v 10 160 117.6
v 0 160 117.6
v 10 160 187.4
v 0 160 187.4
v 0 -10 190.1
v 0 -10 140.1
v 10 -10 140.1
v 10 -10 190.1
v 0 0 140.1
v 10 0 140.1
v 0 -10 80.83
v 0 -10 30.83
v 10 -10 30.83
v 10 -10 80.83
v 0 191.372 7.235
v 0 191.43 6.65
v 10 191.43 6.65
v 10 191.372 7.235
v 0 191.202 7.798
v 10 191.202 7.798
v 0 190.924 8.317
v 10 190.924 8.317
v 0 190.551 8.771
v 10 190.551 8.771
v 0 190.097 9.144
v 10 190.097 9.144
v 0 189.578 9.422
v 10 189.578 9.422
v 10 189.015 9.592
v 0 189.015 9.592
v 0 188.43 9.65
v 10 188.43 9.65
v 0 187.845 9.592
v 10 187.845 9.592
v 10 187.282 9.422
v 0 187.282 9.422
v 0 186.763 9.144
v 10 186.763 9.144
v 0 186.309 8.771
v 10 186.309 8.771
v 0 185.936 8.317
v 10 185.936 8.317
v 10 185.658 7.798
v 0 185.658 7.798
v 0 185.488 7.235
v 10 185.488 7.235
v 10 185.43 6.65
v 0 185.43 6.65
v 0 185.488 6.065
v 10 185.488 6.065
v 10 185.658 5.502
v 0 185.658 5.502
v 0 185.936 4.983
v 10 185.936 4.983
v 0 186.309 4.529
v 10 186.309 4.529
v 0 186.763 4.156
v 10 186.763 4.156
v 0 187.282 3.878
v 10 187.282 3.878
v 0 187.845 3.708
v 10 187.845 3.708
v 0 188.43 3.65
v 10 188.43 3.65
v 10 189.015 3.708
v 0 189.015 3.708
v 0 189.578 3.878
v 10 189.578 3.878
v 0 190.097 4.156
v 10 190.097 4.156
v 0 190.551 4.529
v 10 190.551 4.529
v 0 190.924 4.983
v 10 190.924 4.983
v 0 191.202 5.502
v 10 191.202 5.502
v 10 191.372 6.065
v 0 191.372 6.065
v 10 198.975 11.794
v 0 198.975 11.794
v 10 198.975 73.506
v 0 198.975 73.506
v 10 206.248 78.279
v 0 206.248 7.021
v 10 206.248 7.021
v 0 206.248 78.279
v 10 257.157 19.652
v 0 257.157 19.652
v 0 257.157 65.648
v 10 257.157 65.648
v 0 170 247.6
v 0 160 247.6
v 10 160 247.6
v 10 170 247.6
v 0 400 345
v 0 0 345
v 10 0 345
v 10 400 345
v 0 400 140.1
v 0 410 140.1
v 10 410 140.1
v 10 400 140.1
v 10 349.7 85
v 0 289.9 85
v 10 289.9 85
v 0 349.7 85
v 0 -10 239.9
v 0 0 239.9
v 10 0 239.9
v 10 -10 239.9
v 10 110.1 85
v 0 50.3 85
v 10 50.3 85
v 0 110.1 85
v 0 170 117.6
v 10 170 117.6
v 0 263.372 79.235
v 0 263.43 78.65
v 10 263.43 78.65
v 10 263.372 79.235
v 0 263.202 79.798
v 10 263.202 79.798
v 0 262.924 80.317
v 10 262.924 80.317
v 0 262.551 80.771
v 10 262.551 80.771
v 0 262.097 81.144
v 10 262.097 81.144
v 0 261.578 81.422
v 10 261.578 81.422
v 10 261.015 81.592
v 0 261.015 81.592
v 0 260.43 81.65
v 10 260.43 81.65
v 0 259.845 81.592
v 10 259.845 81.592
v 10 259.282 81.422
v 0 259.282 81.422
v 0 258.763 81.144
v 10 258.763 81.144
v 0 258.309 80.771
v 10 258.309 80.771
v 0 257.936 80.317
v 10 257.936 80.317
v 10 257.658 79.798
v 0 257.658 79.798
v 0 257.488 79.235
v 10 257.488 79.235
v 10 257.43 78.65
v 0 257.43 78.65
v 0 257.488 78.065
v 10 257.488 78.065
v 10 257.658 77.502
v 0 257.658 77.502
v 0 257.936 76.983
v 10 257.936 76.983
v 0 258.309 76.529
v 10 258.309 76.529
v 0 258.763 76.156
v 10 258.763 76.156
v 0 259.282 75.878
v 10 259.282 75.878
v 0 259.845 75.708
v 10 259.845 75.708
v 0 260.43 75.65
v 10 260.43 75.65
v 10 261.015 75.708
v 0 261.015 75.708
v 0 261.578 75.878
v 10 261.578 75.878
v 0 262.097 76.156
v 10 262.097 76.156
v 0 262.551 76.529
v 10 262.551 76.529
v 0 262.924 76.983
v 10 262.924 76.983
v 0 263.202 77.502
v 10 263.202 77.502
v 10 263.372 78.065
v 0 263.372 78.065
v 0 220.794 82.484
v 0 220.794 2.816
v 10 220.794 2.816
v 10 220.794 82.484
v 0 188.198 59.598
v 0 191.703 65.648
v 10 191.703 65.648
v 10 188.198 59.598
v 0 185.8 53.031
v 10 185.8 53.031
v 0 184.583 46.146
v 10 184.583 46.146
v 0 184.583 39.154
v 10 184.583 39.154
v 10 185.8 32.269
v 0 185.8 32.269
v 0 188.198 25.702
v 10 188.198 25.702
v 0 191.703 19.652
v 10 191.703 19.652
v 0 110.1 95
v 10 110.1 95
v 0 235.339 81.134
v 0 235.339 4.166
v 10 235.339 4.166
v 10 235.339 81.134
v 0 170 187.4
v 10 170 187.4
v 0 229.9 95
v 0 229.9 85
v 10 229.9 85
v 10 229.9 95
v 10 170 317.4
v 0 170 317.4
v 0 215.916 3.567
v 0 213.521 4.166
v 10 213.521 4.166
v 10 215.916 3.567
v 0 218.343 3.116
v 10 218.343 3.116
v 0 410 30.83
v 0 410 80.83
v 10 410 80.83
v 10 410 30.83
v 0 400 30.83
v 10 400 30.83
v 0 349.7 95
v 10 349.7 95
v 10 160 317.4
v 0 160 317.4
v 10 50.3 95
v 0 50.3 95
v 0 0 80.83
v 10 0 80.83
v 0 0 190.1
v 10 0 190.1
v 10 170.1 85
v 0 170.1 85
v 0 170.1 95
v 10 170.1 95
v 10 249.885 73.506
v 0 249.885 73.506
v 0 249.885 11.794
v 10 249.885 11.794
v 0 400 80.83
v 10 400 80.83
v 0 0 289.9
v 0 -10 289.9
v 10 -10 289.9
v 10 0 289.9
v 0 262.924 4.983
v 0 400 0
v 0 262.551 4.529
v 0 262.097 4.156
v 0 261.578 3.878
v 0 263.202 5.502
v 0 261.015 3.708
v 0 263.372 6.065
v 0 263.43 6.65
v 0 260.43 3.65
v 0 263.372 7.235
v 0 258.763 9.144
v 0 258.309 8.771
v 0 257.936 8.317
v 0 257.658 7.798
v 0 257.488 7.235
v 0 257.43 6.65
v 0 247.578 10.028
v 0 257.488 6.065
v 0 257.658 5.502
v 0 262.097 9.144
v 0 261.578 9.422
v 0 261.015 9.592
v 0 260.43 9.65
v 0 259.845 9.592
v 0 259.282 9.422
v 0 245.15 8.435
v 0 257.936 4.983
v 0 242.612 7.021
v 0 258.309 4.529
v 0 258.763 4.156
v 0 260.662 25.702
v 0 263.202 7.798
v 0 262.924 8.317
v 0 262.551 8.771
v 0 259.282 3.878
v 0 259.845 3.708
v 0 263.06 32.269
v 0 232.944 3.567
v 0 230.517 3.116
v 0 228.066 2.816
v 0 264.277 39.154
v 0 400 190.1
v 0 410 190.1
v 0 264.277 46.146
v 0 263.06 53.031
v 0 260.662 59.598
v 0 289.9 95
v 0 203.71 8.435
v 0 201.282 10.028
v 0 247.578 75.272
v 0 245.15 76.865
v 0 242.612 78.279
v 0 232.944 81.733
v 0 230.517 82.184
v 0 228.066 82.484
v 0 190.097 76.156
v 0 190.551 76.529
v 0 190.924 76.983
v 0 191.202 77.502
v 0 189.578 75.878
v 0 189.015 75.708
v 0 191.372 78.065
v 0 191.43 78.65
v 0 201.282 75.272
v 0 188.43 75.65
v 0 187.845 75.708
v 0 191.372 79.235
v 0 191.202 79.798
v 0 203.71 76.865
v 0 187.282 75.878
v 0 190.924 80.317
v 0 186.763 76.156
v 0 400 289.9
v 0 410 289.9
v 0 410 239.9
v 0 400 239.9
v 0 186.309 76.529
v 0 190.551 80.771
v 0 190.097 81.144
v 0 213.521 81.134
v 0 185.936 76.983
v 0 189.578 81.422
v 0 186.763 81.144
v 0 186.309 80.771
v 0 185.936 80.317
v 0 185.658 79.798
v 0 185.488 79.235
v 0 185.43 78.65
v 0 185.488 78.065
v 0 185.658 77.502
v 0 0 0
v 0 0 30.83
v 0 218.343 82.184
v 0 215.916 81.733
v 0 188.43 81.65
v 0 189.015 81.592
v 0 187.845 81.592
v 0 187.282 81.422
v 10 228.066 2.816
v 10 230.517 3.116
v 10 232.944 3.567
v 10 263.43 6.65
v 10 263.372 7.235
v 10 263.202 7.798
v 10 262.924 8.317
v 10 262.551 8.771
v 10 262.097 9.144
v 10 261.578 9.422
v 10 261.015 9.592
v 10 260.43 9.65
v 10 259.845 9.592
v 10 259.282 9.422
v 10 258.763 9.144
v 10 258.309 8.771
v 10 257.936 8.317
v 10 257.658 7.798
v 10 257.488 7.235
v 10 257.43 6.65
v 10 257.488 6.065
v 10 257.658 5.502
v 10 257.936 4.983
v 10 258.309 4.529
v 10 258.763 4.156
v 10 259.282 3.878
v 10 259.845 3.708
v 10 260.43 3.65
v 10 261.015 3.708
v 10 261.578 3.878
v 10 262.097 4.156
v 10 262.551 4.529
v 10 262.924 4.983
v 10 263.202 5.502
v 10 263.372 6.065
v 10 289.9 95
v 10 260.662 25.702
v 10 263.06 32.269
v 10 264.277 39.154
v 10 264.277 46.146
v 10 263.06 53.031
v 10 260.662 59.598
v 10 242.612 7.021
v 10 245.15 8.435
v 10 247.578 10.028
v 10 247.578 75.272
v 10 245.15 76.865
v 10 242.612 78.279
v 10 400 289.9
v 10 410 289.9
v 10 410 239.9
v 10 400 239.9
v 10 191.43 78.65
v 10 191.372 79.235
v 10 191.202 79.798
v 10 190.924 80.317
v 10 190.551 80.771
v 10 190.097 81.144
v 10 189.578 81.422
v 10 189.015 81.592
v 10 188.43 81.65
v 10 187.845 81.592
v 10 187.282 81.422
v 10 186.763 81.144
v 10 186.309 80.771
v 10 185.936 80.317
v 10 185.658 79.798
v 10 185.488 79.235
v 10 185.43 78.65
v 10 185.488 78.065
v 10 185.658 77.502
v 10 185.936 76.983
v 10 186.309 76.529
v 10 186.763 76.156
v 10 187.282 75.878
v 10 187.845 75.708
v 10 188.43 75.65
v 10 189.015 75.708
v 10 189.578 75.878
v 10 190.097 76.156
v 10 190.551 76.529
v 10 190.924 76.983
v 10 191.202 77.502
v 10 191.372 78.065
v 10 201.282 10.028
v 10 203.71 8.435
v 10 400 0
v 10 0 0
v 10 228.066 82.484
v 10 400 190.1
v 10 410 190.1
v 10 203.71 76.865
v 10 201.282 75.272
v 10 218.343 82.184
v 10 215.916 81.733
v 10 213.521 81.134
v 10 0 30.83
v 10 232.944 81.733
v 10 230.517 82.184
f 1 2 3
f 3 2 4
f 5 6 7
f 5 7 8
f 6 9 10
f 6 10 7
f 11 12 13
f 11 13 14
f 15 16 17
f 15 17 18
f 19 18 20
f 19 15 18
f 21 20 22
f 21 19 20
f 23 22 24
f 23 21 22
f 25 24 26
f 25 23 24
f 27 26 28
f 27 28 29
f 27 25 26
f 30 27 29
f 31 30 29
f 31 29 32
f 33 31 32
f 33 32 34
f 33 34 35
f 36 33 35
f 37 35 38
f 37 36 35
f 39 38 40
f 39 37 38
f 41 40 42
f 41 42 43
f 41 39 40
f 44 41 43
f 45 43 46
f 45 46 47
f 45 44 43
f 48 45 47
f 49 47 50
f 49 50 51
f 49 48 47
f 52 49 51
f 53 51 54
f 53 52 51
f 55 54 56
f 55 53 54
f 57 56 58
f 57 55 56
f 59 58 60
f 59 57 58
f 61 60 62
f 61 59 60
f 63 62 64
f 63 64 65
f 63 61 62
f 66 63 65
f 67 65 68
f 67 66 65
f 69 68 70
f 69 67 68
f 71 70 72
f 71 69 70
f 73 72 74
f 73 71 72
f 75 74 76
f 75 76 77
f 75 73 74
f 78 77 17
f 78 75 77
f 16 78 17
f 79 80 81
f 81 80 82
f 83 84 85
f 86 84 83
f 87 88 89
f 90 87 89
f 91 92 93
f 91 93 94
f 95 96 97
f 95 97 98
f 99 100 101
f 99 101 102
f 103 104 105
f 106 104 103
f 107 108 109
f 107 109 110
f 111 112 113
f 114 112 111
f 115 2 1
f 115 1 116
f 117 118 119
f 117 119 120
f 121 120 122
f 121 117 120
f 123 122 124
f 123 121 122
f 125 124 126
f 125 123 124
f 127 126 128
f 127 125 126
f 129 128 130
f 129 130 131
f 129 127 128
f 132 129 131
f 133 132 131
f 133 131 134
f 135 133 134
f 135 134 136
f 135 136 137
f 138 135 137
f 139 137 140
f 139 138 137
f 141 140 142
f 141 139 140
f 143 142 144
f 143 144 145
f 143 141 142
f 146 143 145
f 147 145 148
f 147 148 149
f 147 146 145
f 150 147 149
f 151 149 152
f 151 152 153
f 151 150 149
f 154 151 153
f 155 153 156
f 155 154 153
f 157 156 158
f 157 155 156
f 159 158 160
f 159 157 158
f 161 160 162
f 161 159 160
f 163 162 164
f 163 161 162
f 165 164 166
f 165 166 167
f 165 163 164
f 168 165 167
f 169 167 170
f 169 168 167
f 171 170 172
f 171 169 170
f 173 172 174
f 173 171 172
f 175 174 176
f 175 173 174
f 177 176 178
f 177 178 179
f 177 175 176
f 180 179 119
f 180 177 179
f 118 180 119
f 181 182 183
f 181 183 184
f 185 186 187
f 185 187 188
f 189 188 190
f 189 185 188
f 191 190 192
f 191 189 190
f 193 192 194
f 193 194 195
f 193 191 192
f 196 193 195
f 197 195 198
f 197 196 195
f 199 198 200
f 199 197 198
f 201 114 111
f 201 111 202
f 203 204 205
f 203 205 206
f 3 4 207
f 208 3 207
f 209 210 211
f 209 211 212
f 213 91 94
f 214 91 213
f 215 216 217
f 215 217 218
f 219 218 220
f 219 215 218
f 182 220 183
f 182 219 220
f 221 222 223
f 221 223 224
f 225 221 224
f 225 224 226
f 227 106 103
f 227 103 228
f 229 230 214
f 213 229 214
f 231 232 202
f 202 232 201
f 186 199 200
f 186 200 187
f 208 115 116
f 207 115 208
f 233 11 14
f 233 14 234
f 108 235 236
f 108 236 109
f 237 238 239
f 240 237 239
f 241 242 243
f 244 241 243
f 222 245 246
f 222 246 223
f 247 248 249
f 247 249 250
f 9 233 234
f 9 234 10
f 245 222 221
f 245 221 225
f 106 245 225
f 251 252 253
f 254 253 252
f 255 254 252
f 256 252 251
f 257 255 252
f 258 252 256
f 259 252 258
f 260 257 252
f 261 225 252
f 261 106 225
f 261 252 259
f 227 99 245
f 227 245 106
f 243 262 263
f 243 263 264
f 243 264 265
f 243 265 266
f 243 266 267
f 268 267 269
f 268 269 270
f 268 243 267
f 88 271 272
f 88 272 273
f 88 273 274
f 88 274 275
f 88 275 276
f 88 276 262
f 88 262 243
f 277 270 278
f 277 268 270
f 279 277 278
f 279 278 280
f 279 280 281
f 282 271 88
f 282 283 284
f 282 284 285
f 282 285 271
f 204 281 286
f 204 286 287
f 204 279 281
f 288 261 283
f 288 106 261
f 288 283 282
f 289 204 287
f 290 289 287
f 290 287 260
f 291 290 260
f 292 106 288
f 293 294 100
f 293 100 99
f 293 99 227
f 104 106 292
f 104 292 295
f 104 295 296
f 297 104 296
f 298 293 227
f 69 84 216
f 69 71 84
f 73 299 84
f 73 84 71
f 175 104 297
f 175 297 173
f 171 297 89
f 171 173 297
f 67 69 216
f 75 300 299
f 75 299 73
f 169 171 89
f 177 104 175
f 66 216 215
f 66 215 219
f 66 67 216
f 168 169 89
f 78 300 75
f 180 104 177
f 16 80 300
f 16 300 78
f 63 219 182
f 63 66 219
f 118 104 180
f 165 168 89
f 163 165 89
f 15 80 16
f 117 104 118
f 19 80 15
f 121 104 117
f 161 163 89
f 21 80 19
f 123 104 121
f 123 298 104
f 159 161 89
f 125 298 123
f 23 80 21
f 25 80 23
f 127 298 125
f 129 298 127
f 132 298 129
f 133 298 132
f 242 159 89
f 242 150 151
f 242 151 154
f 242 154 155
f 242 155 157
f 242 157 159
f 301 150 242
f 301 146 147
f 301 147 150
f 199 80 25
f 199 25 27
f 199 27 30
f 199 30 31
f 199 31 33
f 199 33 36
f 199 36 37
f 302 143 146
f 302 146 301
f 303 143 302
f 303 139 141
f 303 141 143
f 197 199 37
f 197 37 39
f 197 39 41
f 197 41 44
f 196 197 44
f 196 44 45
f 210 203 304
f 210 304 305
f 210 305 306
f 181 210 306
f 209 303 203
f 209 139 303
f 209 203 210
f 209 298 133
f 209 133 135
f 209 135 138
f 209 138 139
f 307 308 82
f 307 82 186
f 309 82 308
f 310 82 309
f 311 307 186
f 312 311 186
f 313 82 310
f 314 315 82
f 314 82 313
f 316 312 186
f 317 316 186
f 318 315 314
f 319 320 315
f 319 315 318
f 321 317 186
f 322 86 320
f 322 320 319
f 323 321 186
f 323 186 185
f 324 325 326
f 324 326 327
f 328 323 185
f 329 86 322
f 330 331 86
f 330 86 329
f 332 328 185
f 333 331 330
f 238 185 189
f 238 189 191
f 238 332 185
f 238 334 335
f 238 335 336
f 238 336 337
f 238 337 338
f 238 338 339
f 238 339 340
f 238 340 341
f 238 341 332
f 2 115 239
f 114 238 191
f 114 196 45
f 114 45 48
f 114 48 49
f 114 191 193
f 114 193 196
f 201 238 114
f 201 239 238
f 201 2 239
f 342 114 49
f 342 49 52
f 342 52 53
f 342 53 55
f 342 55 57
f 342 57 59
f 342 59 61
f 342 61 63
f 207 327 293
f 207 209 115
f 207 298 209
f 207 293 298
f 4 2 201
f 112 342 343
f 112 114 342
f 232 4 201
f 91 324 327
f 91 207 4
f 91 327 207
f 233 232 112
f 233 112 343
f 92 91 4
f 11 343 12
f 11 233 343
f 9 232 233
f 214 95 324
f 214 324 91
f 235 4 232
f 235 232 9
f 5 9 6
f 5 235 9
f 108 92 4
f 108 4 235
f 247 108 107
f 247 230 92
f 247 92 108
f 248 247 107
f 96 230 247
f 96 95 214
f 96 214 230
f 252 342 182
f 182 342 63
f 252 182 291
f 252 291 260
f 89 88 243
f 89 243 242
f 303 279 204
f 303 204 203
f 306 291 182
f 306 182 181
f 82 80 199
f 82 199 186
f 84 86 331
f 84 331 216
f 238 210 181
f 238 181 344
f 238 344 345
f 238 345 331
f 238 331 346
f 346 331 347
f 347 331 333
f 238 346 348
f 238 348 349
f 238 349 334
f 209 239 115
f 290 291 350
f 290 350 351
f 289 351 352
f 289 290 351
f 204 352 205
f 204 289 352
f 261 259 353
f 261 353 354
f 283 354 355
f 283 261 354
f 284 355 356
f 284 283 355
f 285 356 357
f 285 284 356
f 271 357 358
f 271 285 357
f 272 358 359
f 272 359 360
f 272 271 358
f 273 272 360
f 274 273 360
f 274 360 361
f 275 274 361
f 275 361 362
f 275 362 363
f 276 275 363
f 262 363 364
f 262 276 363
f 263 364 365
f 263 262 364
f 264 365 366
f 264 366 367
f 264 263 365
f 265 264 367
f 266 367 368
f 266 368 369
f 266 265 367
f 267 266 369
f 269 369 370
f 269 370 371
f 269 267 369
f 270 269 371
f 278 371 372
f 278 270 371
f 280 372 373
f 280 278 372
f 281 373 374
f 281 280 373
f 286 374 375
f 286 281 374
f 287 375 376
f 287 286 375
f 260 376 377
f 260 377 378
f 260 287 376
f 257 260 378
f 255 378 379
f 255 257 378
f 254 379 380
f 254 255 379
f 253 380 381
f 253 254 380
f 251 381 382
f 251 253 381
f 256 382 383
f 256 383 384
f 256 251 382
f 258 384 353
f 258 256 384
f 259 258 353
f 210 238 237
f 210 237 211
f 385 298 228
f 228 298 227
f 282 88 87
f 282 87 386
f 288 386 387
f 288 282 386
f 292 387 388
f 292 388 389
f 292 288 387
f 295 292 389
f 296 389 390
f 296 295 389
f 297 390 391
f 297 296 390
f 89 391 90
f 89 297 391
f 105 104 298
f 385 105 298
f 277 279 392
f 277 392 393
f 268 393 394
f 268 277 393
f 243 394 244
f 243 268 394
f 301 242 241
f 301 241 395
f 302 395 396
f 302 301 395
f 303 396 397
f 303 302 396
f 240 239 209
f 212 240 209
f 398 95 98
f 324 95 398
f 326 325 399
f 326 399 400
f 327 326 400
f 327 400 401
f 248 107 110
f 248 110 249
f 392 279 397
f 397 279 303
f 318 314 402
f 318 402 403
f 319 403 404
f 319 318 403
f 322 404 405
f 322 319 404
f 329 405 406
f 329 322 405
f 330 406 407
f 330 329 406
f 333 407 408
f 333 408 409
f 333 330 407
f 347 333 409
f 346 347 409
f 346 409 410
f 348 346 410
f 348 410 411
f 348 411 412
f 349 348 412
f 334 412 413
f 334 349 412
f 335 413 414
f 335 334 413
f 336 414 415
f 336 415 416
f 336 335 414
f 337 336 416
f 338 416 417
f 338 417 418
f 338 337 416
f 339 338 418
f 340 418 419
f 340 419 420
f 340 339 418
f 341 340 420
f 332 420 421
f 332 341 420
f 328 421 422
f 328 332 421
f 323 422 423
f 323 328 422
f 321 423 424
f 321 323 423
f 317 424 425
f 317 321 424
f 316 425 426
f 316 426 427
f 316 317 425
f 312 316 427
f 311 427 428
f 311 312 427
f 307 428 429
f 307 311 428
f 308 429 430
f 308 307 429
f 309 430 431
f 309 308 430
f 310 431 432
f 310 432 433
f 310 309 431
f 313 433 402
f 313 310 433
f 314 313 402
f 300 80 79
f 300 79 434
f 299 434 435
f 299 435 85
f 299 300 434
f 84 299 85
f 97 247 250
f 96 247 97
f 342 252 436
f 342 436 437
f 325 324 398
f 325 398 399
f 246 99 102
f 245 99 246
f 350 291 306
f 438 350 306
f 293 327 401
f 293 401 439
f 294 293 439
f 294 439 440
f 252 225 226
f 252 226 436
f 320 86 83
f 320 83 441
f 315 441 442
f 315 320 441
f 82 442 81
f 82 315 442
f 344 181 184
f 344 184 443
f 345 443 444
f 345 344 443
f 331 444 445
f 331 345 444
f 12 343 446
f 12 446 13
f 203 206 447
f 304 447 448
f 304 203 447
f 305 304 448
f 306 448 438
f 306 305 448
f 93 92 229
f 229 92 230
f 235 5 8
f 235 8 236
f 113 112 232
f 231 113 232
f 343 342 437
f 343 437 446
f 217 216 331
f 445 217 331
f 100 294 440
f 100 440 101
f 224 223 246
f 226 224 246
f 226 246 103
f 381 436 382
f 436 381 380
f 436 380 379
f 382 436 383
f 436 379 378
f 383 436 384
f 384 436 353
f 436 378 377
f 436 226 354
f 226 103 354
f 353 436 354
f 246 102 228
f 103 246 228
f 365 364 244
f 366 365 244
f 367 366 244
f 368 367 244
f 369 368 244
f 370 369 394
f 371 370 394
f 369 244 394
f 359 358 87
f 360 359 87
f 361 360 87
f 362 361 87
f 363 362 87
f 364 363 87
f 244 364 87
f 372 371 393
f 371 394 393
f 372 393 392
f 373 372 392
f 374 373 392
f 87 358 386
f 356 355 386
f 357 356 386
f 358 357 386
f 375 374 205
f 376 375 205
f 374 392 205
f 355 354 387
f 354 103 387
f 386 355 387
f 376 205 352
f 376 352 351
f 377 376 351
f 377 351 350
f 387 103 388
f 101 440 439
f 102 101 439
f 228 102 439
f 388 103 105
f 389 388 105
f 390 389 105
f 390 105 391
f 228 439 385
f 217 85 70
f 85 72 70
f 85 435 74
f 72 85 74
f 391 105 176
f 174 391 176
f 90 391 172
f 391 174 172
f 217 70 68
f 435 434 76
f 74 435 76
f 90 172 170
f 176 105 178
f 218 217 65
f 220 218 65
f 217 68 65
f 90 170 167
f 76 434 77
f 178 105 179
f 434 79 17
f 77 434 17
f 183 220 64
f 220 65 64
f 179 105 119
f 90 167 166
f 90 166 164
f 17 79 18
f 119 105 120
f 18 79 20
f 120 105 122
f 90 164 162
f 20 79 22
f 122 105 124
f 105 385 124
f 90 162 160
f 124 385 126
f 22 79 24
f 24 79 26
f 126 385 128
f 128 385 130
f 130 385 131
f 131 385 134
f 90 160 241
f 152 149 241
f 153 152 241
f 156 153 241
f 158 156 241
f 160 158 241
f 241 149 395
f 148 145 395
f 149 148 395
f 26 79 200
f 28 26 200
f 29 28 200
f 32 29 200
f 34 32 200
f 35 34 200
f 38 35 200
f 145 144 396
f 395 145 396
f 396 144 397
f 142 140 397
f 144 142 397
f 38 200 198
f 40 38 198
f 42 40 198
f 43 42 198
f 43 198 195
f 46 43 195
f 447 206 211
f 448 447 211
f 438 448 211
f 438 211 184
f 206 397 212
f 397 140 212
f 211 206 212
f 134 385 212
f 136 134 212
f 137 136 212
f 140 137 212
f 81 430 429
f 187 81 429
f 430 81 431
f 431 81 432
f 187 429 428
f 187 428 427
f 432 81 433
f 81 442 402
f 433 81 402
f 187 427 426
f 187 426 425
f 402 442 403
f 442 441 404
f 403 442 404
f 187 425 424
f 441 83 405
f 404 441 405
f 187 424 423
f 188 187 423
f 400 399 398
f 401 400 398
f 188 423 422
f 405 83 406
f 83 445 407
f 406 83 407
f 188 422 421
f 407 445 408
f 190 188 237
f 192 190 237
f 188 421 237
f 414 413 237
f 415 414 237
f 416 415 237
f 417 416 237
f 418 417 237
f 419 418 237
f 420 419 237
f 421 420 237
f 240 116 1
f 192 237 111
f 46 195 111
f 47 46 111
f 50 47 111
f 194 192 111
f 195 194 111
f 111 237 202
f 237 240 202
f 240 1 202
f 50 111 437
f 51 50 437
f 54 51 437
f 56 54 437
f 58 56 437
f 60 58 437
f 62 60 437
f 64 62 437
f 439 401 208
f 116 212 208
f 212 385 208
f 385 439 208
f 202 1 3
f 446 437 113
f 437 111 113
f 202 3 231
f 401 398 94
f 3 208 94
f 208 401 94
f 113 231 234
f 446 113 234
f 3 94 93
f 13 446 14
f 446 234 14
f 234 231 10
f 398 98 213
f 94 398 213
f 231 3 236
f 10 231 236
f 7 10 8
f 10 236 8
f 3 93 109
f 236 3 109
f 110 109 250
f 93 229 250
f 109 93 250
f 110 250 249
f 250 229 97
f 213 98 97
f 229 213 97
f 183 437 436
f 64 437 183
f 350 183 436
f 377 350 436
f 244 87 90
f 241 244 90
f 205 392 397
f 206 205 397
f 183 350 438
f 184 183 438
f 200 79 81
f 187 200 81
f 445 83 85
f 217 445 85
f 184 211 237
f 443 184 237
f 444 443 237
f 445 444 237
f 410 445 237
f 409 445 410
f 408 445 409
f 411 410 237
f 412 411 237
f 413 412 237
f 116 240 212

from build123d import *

# Parameters (mm, degrees)
SKETCH_R   = 3
SKETCH_W   = 59.8
SKETCH_H   = 10
SKETCH_W_2 = 10
SKETCH_H_2 = 69.8
PAD_DEPTH  = 10


with BuildPart() as part:
    # Sketch → Pad (new body)
    with BuildSketch(Plane.YZ):
        Polygon((0, 0), (0, 30.83), (-10, 30.83), (-10, 80.83), (0, 80.83), (0, 140.1), (-10, 140.1), (-10, 190.1), (0, 190.1), (0, 239.9), (-10, 239.9), (-10, 289.9), (0, 289.9), (0, 345), (400, 345), (400, 289.9), (410, 289.9), (410, 239.9), (400, 239.9), (400, 190.1), (410, 190.1), (410, 140.1), (400, 140.1), (400, 80.83), (410, 80.83), (410, 30.83), (400, 30.83), (400, 0), align=None)
        with Locations((188.43, 6.65)):
            Circle(SKETCH_R, mode=Mode.SUBTRACT)
        with Locations((260.43, 6.65)):
            Circle(SKETCH_R, mode=Mode.SUBTRACT)
        with Locations((260.43, 78.65)):
            Circle(SKETCH_R, mode=Mode.SUBTRACT)
        with Locations((188.43, 78.65)):
            Circle(SKETCH_R, mode=Mode.SUBTRACT)
        with Locations((80.2, 90)):
            Rectangle(SKETCH_W, SKETCH_H, mode=Mode.SUBTRACT)
        with Locations((200, 90)):
            Rectangle(SKETCH_W, SKETCH_H, mode=Mode.SUBTRACT)
        with Locations((319.8, 90)):
            Rectangle(SKETCH_W, SKETCH_H, mode=Mode.SUBTRACT)
        with Locations((165, 282.5)):
            Rectangle(SKETCH_W_2, SKETCH_H_2, mode=Mode.SUBTRACT)
        with Locations((165, 152.5)):
            Rectangle(SKETCH_W_2, SKETCH_H_2, mode=Mode.SUBTRACT)
        with BuildLine():
            ThreePointArc((191.702727, 65.648383), (184.43, 42.65), (191.702727, 19.651617))
            Line((191.702727, 19.651617), (191.702727, 65.648383))
        make_face(mode=Mode.SUBTRACT)
        with BuildLine():
            Line((198.975455, 11.794431), (198.975455, 73.505569))
            ThreePointArc((206.248182, 78.278942), (202.481667, 76.090554), (198.975455, 73.505569))
            Line((206.248182, 7.021058), (206.248182, 78.278942))
            ThreePointArc((198.975455, 11.794431), (202.481667, 9.209446), (206.248182, 7.021058))
        make_face(mode=Mode.SUBTRACT)
        with BuildLine():
            Line((213.520909, 4.166345), (213.520909, 81.133655))
            ThreePointArc((220.793636, 82.484368), (217.125983, 81.977488), (213.520909, 81.133655))
            Line((220.793636, 2.815632), (220.793636, 82.484368))
            ThreePointArc((213.520909, 4.166345), (217.125983, 3.322512), (220.793636, 2.815632))
        make_face(mode=Mode.SUBTRACT)
        with BuildLine():
            Line((228.066364, 2.815632), (228.066364, 82.484368))
            ThreePointArc((235.339091, 81.133655), (231.734017, 81.977488), (228.066364, 82.484368))
            Line((235.339091, 4.166345), (235.339091, 81.133655))
            ThreePointArc((228.066364, 2.815632), (231.734017, 3.322512), (235.339091, 4.166345))
        make_face(mode=Mode.SUBTRACT)
        with BuildLine():
            Line((242.611818, 7.021058), (242.611818, 78.278942))
            ThreePointArc((249.884545, 73.505569), (246.378333, 76.090554), (242.611818, 78.278942))
            Line((249.884545, 73.505569), (249.884545, 11.794431))
            ThreePointArc((242.611818, 7.021058), (246.378333, 9.209446), (249.884545, 11.794431))
        make_face(mode=Mode.SUBTRACT)
        with BuildLine():
            Line((257.157273, 19.651617), (257.157273, 65.648383))
            ThreePointArc((257.157273, 19.651617), (264.43, 42.65), (257.157273, 65.648383))
        make_face(mode=Mode.SUBTRACT)
    extrude(amount=PAD_DEPTH)


solid = part.part
